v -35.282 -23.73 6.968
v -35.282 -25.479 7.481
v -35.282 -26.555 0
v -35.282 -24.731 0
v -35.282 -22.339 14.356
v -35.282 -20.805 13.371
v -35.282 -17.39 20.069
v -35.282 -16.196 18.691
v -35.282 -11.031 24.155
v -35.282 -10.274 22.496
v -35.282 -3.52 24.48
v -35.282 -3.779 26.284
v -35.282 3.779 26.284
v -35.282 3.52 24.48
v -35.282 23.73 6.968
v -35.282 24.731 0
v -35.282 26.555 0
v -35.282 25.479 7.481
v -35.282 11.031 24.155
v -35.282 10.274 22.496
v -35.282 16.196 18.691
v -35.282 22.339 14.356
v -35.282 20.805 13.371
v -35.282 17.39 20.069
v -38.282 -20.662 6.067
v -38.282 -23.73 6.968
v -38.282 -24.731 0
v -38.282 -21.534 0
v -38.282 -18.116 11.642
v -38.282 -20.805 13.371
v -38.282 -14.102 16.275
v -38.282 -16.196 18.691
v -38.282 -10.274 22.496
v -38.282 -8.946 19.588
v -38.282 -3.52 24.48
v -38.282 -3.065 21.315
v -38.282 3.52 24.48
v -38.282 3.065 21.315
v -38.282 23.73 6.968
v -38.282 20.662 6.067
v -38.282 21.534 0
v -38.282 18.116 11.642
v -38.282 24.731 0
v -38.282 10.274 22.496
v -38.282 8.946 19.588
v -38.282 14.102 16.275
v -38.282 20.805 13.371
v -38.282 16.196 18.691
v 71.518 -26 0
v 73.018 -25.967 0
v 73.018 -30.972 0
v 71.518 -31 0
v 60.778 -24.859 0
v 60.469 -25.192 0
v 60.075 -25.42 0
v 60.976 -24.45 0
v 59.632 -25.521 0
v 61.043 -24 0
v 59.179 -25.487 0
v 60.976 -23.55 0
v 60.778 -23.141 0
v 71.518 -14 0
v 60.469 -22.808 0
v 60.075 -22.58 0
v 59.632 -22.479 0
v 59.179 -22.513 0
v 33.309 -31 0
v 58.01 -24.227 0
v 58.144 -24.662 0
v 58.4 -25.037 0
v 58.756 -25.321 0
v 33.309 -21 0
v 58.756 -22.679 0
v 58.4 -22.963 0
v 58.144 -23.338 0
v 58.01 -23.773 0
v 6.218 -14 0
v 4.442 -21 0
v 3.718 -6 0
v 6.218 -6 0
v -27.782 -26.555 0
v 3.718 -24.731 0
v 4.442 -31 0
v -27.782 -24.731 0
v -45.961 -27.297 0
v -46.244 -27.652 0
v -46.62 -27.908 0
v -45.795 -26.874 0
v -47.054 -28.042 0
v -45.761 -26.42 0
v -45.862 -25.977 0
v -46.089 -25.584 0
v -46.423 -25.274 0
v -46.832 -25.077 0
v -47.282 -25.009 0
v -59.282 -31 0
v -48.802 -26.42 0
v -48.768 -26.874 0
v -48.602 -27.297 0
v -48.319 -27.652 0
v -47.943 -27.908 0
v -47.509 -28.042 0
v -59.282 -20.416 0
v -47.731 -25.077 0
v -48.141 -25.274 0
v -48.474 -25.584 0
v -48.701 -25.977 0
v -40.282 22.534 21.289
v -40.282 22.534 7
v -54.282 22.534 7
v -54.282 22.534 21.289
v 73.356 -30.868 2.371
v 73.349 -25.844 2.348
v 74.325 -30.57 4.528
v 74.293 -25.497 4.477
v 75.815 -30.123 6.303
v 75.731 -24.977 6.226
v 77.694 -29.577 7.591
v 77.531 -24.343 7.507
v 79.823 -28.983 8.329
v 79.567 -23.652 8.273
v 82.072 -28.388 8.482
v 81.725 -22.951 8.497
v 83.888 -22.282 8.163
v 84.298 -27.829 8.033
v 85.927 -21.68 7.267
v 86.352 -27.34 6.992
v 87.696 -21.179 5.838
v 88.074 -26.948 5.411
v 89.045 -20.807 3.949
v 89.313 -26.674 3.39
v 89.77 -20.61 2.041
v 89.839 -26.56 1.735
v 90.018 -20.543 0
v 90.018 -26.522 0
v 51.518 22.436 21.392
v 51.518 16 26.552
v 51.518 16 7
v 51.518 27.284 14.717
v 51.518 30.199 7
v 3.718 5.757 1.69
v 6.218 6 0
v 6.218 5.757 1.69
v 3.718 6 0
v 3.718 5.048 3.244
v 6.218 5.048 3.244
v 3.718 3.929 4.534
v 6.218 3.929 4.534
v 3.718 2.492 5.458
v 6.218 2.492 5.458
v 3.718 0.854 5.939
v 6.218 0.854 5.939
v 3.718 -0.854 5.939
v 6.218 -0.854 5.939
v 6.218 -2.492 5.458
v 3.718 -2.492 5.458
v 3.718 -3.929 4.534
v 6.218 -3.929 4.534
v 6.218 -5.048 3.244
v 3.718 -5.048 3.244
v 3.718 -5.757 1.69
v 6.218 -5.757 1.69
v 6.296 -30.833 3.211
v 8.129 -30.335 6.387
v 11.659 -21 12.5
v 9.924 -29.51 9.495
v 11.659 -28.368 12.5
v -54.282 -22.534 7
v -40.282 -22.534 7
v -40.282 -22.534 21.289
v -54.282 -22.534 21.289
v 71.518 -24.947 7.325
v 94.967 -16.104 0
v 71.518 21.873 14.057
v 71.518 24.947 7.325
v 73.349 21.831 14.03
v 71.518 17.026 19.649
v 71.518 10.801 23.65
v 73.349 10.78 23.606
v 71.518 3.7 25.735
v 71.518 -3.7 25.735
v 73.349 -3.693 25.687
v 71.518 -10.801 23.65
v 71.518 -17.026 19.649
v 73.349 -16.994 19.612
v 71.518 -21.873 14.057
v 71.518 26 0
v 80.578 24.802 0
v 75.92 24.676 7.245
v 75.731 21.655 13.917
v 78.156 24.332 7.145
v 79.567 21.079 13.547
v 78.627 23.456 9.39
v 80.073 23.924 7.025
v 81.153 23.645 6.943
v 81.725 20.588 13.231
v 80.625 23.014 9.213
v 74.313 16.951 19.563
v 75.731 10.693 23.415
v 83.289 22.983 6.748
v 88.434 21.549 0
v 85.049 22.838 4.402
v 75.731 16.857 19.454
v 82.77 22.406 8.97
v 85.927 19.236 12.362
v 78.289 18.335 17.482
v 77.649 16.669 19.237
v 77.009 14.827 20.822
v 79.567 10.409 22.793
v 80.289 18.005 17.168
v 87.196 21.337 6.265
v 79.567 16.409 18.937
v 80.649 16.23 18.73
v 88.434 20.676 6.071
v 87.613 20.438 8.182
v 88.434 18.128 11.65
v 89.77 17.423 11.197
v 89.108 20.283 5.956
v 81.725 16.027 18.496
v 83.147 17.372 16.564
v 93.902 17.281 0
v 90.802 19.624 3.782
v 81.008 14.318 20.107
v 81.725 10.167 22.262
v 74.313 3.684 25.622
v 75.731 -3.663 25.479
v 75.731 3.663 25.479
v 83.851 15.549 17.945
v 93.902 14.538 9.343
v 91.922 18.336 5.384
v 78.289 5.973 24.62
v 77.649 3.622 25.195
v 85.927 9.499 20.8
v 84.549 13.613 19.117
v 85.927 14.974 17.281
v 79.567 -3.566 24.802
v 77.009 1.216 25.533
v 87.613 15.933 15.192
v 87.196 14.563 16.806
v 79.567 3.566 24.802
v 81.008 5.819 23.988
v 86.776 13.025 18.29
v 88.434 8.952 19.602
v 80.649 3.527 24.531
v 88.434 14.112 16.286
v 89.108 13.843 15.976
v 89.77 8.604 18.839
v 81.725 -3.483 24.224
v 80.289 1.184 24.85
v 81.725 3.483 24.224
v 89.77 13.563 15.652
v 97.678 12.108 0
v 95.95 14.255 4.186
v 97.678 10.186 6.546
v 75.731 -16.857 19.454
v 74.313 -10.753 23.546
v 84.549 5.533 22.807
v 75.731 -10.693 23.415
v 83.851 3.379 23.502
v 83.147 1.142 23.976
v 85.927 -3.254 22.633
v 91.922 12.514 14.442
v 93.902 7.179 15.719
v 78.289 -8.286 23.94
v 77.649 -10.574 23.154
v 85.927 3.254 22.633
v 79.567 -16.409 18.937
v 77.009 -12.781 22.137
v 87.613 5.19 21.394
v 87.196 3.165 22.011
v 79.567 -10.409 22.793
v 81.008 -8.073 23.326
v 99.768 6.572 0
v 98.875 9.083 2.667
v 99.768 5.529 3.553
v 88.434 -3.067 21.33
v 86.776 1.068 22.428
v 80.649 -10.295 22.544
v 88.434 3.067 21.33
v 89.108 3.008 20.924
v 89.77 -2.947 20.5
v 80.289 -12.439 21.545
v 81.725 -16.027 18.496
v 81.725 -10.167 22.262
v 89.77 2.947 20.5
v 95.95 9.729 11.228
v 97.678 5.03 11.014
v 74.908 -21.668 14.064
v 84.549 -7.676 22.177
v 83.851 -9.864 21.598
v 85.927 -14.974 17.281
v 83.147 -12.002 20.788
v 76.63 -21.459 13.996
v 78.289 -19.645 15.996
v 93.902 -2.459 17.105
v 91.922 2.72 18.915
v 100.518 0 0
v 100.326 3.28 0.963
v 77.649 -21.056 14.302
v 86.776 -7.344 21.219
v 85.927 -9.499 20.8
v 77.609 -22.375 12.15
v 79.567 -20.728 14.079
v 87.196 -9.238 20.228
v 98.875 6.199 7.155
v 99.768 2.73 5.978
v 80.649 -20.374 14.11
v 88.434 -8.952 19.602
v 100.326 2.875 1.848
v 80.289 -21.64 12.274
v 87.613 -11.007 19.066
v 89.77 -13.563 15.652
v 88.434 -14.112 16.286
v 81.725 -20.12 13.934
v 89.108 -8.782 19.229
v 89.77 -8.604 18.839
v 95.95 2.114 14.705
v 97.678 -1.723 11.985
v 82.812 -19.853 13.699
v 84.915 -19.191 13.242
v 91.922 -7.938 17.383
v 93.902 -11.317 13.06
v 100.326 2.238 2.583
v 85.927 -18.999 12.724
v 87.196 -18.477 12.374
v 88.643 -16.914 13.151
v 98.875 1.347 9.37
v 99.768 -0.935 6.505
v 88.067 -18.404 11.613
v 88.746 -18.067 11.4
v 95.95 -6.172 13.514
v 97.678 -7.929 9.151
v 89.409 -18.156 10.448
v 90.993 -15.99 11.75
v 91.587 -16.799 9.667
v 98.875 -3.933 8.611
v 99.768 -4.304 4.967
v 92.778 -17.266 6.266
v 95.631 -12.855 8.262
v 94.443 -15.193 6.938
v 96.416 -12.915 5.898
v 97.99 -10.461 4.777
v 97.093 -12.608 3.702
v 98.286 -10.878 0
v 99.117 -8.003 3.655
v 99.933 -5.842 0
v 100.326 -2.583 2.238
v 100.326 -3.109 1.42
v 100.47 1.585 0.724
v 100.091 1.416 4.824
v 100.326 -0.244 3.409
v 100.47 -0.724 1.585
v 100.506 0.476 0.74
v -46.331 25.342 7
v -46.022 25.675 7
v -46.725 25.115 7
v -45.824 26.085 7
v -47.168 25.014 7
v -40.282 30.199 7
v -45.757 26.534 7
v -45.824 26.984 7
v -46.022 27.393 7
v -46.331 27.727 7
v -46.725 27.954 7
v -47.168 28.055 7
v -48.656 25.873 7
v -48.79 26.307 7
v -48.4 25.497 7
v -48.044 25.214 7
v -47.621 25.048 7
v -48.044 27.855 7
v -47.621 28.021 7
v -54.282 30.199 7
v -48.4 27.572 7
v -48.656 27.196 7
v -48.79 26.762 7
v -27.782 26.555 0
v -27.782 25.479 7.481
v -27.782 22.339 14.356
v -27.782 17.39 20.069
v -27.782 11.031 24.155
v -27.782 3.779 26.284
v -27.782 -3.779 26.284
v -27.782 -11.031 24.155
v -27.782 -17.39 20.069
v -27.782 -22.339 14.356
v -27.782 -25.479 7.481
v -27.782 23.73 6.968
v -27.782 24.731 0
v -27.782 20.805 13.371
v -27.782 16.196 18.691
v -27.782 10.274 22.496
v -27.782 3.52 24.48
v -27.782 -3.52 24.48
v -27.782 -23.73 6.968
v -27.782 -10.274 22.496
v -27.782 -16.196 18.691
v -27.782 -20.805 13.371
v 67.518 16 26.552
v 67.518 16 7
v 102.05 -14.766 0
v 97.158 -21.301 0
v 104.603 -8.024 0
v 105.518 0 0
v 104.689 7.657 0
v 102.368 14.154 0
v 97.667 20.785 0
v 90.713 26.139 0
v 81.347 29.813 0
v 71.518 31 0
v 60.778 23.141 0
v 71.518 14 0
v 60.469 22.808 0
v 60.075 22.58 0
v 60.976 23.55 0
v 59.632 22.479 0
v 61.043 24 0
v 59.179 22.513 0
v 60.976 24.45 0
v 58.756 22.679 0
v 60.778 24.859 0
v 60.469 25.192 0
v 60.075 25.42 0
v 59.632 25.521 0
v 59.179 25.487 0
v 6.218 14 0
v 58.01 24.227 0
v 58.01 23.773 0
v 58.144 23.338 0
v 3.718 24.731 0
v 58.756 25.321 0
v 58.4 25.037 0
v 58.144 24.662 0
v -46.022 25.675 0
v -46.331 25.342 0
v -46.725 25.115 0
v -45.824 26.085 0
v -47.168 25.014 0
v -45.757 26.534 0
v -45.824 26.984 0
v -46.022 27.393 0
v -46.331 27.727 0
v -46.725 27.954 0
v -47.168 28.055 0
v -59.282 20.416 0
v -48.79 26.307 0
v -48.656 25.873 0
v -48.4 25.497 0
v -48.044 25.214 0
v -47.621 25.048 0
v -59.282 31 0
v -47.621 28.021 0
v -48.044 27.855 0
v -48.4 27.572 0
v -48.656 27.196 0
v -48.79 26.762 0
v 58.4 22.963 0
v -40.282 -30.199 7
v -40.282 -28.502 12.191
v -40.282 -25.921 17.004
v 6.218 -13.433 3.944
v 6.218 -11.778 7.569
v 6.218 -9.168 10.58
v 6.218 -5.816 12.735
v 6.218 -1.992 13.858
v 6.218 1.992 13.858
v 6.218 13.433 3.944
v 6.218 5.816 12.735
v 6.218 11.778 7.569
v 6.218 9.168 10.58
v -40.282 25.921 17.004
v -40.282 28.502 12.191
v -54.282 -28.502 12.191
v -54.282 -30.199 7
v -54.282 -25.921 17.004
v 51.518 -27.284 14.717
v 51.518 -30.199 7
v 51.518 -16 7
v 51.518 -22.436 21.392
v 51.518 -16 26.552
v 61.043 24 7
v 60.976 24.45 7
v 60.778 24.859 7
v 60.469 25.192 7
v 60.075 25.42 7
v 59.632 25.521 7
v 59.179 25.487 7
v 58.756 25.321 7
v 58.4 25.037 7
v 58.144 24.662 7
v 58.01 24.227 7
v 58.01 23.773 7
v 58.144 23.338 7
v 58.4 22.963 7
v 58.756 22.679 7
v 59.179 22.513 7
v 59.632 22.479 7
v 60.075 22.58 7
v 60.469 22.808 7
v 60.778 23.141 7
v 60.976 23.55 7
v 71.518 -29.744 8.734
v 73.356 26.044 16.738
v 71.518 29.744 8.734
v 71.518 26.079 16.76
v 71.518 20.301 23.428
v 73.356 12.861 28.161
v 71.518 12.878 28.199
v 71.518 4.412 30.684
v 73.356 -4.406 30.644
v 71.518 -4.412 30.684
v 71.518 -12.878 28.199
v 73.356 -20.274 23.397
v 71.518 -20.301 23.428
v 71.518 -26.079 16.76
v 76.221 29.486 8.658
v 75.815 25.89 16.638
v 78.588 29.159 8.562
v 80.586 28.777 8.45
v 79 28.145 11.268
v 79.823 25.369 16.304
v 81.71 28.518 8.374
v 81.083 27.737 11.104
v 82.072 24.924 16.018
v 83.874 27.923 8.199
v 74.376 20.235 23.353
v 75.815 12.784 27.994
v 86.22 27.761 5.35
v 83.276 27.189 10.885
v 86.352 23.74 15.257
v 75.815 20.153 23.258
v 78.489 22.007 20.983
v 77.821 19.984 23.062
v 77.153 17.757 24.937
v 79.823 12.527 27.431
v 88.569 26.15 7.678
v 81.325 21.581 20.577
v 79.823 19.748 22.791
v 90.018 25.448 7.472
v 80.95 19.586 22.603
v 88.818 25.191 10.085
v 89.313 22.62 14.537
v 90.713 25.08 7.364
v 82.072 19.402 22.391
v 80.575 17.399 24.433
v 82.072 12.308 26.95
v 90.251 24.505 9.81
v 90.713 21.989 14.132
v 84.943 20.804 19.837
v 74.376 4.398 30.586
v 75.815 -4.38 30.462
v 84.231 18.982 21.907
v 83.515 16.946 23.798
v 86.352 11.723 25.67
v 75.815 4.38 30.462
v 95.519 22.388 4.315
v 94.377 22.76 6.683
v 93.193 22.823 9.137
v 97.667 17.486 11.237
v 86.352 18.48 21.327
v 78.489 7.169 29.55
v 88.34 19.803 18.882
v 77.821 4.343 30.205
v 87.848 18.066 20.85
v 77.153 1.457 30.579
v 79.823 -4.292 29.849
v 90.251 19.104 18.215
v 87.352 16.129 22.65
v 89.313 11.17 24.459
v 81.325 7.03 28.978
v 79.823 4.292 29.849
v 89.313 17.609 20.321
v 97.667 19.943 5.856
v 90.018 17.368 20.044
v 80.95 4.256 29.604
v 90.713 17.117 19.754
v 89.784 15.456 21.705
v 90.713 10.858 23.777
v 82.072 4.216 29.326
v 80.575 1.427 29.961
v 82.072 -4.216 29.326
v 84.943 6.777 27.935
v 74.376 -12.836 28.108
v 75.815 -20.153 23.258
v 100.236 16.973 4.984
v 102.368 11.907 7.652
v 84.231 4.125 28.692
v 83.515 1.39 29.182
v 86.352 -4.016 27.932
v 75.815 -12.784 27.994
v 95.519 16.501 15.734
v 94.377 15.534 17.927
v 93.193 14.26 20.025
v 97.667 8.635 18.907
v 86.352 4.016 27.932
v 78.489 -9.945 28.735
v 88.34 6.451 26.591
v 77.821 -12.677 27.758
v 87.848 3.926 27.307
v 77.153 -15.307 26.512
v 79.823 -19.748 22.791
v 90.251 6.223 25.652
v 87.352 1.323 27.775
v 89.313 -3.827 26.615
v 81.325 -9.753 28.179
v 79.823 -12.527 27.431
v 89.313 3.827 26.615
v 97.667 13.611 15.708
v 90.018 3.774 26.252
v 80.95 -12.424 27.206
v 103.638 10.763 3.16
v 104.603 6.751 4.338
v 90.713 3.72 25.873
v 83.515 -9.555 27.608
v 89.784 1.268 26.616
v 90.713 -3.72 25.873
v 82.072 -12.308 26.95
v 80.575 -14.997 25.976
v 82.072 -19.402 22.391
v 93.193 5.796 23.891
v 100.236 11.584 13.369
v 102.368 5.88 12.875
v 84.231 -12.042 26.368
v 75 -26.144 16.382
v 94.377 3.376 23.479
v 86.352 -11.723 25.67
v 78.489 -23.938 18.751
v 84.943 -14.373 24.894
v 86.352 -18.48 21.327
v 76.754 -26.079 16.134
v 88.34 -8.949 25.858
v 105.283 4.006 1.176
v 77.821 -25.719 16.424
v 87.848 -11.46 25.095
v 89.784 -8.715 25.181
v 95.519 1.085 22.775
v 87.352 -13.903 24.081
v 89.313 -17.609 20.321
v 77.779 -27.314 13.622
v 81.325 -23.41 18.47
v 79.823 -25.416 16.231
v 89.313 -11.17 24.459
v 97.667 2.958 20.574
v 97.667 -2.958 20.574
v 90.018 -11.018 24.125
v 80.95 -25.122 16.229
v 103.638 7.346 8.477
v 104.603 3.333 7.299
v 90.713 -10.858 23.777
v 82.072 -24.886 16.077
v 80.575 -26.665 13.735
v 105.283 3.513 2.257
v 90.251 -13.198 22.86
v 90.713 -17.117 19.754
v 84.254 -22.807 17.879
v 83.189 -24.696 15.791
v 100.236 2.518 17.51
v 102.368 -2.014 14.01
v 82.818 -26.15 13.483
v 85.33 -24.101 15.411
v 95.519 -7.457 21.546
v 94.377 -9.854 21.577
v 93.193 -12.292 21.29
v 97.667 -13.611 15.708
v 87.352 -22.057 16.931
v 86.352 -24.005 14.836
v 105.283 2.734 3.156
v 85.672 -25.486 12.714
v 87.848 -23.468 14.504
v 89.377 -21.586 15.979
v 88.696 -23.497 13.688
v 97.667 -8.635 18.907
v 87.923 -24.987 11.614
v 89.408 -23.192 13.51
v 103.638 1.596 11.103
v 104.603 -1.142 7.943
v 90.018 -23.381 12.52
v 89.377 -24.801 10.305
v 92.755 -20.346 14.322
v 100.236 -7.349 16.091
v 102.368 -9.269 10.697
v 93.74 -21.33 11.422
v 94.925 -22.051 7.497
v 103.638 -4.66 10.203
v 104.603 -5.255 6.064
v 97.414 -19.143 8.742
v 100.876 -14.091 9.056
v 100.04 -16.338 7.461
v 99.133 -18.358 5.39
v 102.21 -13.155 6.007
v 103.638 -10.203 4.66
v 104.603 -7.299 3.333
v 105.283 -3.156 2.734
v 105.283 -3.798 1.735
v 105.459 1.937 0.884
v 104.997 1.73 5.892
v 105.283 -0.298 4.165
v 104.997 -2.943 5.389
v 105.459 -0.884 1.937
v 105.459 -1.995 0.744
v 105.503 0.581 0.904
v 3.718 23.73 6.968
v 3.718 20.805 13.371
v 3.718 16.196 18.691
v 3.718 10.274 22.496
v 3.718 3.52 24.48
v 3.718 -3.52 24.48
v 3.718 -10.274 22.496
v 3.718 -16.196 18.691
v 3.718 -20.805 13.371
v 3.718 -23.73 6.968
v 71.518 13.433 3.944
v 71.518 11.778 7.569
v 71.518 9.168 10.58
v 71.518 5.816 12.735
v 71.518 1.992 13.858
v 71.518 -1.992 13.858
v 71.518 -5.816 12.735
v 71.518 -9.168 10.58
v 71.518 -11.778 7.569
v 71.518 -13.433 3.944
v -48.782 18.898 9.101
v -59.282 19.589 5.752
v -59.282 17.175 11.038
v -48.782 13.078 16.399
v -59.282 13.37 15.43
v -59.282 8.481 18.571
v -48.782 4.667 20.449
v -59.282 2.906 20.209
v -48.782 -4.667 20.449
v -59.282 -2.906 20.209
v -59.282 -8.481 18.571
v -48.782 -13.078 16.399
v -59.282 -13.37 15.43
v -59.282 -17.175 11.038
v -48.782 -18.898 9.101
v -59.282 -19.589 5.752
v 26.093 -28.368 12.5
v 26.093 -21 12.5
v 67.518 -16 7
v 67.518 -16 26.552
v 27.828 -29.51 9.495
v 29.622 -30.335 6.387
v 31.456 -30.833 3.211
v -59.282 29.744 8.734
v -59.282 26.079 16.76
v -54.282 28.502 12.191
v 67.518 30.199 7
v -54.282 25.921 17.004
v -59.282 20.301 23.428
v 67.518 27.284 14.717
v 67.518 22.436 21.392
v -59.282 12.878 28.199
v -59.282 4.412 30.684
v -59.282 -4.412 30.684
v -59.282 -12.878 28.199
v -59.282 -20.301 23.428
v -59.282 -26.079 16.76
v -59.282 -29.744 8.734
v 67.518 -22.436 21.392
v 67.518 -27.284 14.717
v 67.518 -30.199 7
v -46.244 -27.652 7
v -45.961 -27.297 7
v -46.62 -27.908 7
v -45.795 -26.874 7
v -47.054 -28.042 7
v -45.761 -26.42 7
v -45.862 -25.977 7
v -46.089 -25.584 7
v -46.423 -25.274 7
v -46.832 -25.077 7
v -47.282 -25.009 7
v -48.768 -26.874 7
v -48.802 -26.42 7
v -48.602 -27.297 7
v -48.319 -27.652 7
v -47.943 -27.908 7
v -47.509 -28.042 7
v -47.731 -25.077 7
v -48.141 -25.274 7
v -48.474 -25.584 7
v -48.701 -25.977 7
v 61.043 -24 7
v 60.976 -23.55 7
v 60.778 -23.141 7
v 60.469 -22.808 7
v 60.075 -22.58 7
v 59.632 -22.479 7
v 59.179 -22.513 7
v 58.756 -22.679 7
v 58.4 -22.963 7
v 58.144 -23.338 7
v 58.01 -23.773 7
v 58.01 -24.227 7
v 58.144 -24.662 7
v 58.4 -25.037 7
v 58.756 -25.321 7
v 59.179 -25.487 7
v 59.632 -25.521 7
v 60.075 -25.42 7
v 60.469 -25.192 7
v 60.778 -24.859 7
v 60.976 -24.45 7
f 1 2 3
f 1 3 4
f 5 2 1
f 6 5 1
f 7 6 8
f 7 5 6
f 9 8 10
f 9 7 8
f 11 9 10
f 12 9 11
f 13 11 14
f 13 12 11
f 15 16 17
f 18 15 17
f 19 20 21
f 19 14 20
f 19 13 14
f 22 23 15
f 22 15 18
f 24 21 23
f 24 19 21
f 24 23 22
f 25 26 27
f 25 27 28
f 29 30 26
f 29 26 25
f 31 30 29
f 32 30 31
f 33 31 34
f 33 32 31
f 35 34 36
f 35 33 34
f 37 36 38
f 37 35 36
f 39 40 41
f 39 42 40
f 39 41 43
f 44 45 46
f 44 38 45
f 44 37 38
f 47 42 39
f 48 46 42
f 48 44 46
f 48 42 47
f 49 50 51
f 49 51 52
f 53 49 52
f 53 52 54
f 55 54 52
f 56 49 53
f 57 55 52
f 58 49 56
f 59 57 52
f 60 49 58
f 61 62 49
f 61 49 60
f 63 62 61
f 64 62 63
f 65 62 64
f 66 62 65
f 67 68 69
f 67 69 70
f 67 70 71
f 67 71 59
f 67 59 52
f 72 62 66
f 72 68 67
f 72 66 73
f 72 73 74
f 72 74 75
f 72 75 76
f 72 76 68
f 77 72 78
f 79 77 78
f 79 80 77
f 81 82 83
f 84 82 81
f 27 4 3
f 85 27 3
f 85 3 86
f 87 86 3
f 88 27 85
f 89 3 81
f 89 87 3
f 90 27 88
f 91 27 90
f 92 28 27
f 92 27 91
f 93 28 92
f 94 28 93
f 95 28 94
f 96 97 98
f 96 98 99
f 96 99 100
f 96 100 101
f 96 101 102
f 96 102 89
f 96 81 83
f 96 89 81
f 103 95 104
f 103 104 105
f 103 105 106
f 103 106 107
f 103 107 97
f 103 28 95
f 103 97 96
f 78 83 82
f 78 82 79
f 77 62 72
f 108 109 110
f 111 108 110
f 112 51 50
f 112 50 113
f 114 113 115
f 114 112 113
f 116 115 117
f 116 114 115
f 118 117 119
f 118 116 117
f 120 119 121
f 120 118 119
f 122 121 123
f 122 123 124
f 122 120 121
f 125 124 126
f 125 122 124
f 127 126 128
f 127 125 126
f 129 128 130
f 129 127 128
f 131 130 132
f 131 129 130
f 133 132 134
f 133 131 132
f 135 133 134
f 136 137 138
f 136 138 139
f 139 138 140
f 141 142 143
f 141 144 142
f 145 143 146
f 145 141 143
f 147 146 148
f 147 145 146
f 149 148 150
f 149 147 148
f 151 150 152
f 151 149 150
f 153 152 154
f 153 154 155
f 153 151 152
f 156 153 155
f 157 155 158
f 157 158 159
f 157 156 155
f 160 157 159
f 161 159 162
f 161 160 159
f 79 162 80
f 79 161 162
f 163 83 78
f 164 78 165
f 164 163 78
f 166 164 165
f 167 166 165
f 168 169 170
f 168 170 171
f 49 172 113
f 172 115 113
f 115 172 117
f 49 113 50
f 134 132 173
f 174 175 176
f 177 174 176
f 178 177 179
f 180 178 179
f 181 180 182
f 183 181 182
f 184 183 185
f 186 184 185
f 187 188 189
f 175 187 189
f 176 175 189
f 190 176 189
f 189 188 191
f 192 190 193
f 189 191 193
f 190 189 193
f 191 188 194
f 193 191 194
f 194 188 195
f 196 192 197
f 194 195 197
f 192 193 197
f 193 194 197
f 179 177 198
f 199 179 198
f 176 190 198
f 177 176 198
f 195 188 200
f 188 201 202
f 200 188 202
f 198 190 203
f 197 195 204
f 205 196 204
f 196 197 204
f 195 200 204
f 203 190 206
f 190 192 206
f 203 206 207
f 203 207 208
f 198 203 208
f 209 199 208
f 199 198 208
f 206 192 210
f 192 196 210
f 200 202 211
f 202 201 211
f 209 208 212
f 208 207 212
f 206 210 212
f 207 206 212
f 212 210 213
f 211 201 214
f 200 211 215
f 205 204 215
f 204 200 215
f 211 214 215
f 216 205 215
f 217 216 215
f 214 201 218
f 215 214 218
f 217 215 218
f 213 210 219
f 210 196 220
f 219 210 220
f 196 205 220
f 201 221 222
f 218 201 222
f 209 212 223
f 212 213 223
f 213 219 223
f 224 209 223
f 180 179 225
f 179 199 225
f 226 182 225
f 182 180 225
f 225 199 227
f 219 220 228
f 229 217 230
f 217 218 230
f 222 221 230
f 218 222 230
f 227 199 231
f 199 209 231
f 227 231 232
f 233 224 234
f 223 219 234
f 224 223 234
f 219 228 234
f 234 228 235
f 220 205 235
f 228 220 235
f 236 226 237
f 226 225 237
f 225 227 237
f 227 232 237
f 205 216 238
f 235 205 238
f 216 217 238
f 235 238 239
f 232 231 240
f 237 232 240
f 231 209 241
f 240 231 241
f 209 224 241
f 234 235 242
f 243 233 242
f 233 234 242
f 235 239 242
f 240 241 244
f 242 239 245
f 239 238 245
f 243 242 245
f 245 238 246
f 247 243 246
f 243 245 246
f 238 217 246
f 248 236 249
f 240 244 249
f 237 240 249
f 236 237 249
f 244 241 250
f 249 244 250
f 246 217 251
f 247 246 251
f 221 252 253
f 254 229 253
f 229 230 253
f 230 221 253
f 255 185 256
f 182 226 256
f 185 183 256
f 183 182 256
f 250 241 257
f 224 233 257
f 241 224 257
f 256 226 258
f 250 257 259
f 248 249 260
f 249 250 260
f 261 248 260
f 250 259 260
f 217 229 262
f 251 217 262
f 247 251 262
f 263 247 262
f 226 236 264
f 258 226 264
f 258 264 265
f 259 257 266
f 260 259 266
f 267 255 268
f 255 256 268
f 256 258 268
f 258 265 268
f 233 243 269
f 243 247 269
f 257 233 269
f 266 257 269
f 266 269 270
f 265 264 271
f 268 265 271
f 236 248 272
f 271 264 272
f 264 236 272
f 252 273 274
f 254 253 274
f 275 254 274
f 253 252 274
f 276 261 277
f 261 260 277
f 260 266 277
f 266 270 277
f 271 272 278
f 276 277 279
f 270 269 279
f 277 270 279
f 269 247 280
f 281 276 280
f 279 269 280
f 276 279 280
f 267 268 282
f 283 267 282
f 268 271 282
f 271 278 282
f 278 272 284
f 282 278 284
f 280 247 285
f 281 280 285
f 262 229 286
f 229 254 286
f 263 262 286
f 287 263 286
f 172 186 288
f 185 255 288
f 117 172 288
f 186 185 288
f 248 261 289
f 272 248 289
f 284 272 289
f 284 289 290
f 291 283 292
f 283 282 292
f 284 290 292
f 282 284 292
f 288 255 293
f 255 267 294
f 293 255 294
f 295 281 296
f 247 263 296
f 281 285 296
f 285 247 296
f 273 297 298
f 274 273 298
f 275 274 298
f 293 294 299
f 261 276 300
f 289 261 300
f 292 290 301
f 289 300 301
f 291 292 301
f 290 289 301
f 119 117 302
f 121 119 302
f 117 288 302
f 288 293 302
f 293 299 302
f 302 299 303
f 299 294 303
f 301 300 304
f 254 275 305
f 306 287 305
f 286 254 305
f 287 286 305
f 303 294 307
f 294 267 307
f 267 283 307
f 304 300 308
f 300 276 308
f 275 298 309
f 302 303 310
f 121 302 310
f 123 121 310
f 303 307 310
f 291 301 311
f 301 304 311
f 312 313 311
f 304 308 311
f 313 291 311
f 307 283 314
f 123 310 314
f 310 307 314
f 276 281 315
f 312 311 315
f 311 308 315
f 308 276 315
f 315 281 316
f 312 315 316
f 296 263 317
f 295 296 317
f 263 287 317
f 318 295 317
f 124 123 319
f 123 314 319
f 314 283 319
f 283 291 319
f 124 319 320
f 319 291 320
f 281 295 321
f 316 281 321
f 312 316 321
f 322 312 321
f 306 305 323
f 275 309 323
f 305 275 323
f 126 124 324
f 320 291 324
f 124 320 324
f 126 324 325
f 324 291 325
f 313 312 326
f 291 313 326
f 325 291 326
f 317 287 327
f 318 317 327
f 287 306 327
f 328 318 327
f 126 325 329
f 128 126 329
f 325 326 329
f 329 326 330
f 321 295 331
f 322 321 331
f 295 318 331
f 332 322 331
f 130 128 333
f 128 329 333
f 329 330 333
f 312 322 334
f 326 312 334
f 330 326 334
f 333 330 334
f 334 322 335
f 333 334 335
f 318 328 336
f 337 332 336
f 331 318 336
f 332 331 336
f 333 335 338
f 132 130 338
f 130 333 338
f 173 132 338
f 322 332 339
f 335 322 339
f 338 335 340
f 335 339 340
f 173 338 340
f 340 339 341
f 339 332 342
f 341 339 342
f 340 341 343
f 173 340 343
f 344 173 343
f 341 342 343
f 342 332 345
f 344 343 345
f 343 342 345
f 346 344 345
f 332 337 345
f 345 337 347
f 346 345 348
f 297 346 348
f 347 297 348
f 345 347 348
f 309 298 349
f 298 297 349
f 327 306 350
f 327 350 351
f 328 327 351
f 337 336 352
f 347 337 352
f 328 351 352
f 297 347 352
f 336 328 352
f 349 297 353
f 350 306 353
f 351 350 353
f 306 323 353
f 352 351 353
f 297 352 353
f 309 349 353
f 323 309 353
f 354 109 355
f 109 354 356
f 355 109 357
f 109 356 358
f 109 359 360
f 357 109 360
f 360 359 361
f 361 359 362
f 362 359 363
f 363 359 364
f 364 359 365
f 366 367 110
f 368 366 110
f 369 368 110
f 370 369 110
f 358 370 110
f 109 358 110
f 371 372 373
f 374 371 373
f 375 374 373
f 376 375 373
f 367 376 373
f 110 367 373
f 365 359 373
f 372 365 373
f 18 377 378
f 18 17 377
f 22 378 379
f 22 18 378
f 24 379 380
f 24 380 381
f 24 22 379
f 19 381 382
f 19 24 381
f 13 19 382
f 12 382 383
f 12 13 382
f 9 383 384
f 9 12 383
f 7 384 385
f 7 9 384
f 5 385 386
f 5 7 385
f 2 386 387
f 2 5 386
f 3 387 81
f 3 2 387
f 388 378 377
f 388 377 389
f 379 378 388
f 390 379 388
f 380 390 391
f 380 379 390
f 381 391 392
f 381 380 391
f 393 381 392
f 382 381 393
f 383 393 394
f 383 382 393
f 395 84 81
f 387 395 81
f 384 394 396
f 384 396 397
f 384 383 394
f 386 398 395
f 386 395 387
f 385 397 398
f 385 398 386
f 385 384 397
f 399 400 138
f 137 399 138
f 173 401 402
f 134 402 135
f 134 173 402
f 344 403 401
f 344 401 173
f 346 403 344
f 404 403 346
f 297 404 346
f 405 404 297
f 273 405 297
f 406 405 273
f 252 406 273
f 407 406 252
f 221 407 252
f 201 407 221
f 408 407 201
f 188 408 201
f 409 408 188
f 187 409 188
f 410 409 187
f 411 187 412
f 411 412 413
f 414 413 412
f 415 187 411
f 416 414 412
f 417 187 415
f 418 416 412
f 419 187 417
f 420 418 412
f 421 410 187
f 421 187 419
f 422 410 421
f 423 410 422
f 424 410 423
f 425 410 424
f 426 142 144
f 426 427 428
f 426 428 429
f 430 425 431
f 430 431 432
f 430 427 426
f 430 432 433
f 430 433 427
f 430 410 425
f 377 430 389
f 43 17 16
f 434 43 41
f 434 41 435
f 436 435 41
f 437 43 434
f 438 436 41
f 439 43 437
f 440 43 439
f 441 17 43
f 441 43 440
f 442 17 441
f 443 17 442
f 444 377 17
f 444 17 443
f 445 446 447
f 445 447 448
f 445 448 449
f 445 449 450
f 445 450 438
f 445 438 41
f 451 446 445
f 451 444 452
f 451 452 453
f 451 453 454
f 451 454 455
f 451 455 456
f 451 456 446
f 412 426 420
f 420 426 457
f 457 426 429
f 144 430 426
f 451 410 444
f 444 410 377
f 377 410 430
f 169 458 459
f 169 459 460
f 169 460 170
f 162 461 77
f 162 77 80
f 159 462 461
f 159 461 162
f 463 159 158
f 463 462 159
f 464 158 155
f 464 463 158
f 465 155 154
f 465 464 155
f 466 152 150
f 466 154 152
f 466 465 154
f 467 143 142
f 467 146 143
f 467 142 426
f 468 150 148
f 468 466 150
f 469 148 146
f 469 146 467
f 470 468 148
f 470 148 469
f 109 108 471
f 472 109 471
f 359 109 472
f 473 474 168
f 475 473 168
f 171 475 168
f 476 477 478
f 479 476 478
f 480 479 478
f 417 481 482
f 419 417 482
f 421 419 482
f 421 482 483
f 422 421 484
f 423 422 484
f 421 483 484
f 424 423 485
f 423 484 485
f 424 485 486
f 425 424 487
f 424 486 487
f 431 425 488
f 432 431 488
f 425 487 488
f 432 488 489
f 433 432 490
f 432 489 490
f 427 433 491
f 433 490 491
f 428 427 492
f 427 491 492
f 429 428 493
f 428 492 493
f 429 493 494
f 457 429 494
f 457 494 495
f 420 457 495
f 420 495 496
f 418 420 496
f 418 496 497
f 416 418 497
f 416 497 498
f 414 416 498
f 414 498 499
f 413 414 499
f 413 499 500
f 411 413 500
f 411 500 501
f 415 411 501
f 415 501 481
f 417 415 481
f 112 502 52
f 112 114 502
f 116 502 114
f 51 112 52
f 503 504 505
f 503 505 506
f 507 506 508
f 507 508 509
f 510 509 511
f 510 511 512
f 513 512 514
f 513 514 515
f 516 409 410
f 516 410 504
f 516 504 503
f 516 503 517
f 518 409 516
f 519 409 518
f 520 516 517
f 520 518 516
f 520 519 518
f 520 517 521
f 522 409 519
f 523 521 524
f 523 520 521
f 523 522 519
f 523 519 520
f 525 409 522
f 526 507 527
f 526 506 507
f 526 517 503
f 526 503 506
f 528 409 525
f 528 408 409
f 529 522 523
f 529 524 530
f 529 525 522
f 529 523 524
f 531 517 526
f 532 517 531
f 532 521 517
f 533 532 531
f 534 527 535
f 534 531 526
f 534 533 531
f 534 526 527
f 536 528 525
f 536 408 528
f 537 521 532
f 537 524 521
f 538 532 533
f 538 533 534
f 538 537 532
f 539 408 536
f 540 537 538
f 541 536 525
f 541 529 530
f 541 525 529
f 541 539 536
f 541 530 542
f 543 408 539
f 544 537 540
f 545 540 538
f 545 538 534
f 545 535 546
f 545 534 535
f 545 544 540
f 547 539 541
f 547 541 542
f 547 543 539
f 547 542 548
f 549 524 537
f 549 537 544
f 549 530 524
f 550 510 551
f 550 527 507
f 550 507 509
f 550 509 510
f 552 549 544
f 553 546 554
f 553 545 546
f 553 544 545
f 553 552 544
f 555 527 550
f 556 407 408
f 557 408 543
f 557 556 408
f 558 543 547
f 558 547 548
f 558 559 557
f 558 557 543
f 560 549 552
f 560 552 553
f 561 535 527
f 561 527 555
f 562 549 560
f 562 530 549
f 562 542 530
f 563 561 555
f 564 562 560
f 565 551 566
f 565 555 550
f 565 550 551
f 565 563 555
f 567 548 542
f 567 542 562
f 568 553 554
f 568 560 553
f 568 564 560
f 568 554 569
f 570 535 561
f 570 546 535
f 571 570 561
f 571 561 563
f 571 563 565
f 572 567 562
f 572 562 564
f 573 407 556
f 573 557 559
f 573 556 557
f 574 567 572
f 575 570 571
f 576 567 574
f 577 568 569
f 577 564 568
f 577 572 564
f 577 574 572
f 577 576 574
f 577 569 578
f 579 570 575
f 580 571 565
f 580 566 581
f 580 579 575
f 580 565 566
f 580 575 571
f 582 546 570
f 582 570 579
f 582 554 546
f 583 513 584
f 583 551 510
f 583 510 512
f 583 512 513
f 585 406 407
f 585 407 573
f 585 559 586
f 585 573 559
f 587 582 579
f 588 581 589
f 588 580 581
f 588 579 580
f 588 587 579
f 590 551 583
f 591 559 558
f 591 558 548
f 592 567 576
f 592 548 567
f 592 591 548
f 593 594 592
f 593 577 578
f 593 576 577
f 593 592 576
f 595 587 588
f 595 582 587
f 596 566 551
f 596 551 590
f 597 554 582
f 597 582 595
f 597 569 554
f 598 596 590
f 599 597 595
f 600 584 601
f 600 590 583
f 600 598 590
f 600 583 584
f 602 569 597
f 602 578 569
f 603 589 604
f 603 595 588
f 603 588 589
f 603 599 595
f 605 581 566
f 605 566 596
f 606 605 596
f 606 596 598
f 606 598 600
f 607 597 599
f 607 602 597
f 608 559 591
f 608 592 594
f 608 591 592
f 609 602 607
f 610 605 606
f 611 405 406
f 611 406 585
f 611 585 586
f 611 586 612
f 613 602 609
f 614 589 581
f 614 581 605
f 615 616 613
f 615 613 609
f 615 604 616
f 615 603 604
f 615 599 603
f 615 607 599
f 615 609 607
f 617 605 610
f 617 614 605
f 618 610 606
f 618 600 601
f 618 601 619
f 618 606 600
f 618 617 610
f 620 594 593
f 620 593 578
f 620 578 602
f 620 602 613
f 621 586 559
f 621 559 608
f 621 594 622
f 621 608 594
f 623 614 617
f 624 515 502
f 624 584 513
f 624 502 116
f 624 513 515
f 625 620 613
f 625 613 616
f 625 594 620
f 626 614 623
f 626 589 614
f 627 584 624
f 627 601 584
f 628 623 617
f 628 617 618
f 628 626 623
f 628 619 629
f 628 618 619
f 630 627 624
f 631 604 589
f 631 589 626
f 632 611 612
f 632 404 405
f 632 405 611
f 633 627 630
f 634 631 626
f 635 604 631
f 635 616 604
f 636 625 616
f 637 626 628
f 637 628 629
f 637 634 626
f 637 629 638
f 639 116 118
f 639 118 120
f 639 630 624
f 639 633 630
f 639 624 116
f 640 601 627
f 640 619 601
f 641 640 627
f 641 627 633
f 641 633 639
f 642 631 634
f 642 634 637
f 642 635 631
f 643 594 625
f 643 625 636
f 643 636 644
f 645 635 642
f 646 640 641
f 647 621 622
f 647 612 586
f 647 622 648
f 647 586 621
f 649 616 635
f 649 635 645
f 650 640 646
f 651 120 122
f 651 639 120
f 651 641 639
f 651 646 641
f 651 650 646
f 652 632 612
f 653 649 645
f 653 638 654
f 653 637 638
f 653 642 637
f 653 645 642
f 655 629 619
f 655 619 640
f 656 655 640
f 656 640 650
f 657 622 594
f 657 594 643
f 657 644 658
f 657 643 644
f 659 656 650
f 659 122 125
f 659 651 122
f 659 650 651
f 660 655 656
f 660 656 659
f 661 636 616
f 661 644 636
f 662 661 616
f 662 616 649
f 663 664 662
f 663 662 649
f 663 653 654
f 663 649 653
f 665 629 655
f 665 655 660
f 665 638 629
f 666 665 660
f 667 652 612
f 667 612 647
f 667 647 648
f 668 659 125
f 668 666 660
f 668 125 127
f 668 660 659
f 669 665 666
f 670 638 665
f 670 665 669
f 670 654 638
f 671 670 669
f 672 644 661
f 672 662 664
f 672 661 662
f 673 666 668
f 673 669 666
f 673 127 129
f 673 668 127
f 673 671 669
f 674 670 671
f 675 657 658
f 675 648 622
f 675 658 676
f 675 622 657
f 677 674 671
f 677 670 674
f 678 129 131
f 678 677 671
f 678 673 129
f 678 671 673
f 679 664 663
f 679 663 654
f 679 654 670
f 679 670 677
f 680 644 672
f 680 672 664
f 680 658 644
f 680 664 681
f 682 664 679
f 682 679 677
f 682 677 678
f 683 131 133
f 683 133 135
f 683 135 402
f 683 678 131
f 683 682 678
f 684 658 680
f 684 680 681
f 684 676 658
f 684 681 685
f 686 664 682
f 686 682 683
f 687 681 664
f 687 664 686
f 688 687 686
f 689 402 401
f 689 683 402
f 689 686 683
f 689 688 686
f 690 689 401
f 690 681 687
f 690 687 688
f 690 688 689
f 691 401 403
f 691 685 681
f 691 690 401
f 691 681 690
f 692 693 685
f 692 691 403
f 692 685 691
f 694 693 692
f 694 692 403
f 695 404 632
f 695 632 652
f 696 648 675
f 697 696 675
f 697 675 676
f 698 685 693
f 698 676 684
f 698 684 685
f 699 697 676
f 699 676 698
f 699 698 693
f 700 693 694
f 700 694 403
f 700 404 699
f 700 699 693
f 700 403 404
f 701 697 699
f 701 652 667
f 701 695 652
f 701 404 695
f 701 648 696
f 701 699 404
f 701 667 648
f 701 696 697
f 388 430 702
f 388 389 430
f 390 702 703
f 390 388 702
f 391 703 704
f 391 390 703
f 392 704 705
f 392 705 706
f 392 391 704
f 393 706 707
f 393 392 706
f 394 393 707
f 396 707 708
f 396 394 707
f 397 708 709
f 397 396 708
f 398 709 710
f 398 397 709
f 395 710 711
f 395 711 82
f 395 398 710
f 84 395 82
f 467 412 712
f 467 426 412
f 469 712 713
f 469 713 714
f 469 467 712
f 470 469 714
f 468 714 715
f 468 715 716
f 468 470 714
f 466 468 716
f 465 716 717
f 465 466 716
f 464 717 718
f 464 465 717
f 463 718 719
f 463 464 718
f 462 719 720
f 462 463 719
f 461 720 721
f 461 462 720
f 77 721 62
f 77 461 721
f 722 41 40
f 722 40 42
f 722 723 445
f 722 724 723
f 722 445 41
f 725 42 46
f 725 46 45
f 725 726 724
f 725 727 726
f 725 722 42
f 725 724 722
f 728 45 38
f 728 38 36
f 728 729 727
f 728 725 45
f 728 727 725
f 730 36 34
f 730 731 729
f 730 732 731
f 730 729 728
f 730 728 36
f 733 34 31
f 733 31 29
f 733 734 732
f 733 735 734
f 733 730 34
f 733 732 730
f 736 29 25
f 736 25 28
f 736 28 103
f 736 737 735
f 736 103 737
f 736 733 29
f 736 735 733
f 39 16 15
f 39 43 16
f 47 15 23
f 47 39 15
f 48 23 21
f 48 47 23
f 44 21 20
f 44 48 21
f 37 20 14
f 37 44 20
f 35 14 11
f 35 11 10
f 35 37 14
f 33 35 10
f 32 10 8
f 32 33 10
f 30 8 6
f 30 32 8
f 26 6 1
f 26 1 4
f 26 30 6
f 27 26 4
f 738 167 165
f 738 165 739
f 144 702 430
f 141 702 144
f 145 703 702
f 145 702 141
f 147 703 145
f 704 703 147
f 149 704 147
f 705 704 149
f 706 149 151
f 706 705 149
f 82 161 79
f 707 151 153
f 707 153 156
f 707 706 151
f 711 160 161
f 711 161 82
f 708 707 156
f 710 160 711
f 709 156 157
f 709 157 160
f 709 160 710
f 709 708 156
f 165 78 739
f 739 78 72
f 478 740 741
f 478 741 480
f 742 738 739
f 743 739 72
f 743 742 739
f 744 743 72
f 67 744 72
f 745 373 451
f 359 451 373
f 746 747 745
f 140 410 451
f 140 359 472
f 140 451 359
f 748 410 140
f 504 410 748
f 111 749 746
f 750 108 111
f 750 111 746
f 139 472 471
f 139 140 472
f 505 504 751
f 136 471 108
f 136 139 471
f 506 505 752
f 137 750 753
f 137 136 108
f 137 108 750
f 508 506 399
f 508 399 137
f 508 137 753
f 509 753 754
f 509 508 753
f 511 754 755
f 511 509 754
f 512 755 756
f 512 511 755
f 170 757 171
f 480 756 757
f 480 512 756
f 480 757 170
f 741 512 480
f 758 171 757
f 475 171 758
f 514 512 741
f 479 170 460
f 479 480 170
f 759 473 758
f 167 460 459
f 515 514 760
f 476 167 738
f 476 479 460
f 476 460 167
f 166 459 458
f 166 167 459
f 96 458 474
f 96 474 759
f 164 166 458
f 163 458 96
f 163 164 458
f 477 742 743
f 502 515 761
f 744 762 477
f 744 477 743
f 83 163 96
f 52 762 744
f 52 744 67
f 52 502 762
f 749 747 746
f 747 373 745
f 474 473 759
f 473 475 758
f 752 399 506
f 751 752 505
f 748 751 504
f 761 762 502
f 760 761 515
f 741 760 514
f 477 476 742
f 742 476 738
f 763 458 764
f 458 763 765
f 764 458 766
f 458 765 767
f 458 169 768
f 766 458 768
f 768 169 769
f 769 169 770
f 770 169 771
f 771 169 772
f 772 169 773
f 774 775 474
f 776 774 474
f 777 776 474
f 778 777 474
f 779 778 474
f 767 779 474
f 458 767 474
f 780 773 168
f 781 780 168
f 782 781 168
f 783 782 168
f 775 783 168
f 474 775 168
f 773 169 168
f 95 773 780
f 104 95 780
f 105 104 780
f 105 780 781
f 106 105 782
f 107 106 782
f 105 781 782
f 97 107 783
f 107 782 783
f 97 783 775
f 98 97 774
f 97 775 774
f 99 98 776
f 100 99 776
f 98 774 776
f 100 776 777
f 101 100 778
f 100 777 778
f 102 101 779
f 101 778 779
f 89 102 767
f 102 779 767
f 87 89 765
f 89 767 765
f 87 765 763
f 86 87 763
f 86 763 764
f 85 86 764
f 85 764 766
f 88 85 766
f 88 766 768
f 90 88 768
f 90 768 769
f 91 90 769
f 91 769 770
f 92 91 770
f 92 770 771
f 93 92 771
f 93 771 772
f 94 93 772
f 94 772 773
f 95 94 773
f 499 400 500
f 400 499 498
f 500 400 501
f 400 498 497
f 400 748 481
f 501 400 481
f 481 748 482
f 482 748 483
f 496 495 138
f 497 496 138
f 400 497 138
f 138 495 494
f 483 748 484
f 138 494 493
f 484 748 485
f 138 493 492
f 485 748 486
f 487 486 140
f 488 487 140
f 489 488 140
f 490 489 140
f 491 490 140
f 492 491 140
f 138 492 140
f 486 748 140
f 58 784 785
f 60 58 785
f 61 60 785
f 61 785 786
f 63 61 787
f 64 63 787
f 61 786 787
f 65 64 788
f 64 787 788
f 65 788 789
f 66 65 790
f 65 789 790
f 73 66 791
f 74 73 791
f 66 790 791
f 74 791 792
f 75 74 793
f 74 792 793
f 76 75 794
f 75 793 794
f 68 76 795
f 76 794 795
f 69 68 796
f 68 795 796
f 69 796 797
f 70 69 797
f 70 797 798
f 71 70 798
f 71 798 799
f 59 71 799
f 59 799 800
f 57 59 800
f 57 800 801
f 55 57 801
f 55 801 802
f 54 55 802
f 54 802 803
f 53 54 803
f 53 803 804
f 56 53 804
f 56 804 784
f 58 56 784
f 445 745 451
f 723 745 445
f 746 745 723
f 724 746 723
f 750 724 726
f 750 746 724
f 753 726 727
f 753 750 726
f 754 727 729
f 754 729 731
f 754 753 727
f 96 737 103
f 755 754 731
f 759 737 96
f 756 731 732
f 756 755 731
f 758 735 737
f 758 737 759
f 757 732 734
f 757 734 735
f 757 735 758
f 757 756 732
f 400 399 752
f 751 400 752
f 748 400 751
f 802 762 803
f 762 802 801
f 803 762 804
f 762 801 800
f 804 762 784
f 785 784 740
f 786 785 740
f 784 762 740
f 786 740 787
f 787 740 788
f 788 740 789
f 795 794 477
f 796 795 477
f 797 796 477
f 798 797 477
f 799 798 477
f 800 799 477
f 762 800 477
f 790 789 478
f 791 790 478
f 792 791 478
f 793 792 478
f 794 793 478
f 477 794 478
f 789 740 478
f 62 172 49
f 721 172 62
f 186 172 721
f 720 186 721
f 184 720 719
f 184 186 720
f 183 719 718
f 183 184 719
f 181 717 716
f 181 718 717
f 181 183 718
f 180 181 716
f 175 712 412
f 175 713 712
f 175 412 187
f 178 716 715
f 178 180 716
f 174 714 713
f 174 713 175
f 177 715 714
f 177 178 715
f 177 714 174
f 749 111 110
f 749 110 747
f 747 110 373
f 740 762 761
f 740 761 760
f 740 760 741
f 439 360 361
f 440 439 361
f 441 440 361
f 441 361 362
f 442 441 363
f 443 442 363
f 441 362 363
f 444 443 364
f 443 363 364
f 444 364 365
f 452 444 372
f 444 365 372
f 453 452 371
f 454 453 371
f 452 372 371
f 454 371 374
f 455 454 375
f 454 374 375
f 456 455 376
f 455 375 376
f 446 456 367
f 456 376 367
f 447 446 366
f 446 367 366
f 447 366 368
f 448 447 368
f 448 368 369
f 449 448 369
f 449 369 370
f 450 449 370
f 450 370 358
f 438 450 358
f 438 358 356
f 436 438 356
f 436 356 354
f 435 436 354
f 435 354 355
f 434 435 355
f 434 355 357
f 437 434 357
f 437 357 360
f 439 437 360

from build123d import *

# Parameters (mm, degrees)
REVOLVE1_ANGLE          = 180
CUT_EXTRUDE1_REACH      = 114.566
CUT_EXTRUDE1_END_RADIUS = 31
SKETCH2_W               = 14
SKETCH2_H               = 8.465653043
SKETCH2_W_2             = 16
SKETCH2_H_2             = 15
CUT_EXTRUDE2_REACH      = 114.566
SKETCH3_R               = 1.525
CUT_EXTRUDE3_DEPTH      = 10
CUT_EXTRUDE4_REACH      = 128.25
SKETCH6_R               = 8.5


with BuildPart() as part:
    # Sketch1 → Revolve1 (revolve)
    with BuildSketch(Plane.XY):
        with BuildLine():
            Line((6.218316837, 14), (6.218316837, 6))
            Line((6.218316837, 6), (3.718316837, 6))
            Line((3.718316837, 6), (3.718316837, 24.731367941))
            Line((3.718316837, 24.731367941), (-10.171408573, 24.731367941))
            Line((-10.171408573, 24.731367941), (-27.781683163, 24.731367941))
            Line((-27.781683163, 24.731367941), (-27.781683163, 26.554502519))
            Line((-27.781683163, 26.554502519), (-35.281683163, 26.554502519))
            Line((-35.281683163, 26.554502519), (-35.281683163, 24.731367941))
            Line((-35.281683163, 24.731367941), (-38.281683163, 24.731367941))
            Line((-38.281683163, 24.731367941), (-38.281683163, 21.534346957))
            Line((-38.281683163, 21.534346957), (-59.281683163, 20.416426404))
            Line((-59.281683163, 20.416426404), (-59.281683163, 24.731367941))
            Line((-59.281683163, 24.731367941), (-59.281683163, 31))
            Line((-59.281683163, 31), (-56.981683163, 31))
            Line((-56.981683163, 31), (71.518316837, 31))
            add(Edge.make_bspline(
                [(71.518316837, 31), (87.336893309, 31), (105.518316837, 21.771712161), (105.518316837, 0)],
                knots=[0, 0, 0, 0, 1, 1, 1, 1], degree=3))
            Line((105.518316837, 0), (100.518316813, 0))
            add(Edge.make_bspline(
                [(71.518316837, 26), (84.501211561, 26), (100.518316813, 18.460024777), (100.518316813, 0)],
                knots=[0, 0, 0, 0, 1, 1, 1, 1], degree=3))
            Line((71.518316837, 26), (71.518316837, 14))
            Line((71.518316837, 14), (6.218316837, 14))
        make_face()
    revolve(axis=Axis((-52.937293729, 0, 0), (1, 0, 0)), revolution_arc=REVOLVE1_ANGLE)

    # Cut-Extrude1: up to this cylinder (the profile starts inside it)
    cut_extrude1_end = Plane(origin=(6.118317, 0, 0), z_dir=(-1, 0, 0)) * Cylinder(CUT_EXTRUDE1_END_RADIUS, 398.932, mode=Mode.PRIVATE)
    # Sketch2 → Cut-Extrude1 (cut, up to the surface)
    with BuildSketch(Plane(origin=(0, 0, 7), x_dir=(-1, 0, 0), z_dir=(0, 0, -1)), mode=Mode.PRIVATE) as cut_extrude1_sk1:
        with Locations((47.281683163, 26.767173479)):
            Rectangle(SKETCH2_W, SKETCH2_H)
    cut_extrude1_tool1 = extrude(cut_extrude1_sk1.sketch, amount=-CUT_EXTRUDE1_REACH, mode=Mode.PRIVATE) & cut_extrude1_end
    add(cut_extrude1_tool1.solids().sort_by_distance((-47.281683, 26.767173, 7))[0], mode=Mode.SUBTRACT)
    # Sketch2 → Cut-Extrude1 (cut, up to the surface)
    with BuildSketch(Plane(origin=(0, 0, 7), x_dir=(-1, 0, 0), z_dir=(0, 0, -1)), mode=Mode.PRIVATE) as cut_extrude1_sk2:
        with Locations((-59.518316837, -23.5)):
            Rectangle(SKETCH2_W_2, SKETCH2_H_2)
    cut_extrude1_tool2 = extrude(cut_extrude1_sk2.sketch, amount=-CUT_EXTRUDE1_REACH, mode=Mode.PRIVATE) & cut_extrude1_end
    add(cut_extrude1_tool2.solids().sort_by_distance((59.518317, -23.5, 7))[0], mode=Mode.SUBTRACT)
    # Sketch2 → Cut-Extrude1 (cut, up to the surface)
    with BuildSketch(Plane(origin=(0, 0, 7), x_dir=(-1, 0, 0), z_dir=(0, 0, -1)), mode=Mode.PRIVATE) as cut_extrude1_sk3:
        with Locations((-59.518316837, 23.5)):
            Rectangle(SKETCH2_W_2, SKETCH2_H_2)
    cut_extrude1_tool3 = extrude(cut_extrude1_sk3.sketch, amount=-CUT_EXTRUDE1_REACH, mode=Mode.PRIVATE) & cut_extrude1_end
    add(cut_extrude1_tool3.solids().sort_by_distance((59.518317, 23.5, 7))[0], mode=Mode.SUBTRACT)
    # Sketch2 → Cut-Extrude1 (cut, up to the surface)
    with BuildSketch(Plane(origin=(0, 0, 7), x_dir=(-1, 0, 0), z_dir=(0, 0, -1)), mode=Mode.PRIVATE) as cut_extrude1_sk4:
        with Locations((47.281683163, -26.767173479)):
            Rectangle(SKETCH2_W, SKETCH2_H)
    cut_extrude1_tool4 = extrude(cut_extrude1_sk4.sketch, amount=-CUT_EXTRUDE1_REACH, mode=Mode.PRIVATE) & cut_extrude1_end
    add(cut_extrude1_tool4.solids().sort_by_distance((-47.281683, -26.767173, 7))[0], mode=Mode.SUBTRACT)

    # Sketch3 → Cut-Extrude2 (cut, up to next)
    with BuildSketch(Plane.XY.offset(7), mode=Mode.PRIVATE) as cut_extrude2_sk1:
        with Locations((-47.281683163, 26.534346957)):
            Circle(SKETCH3_R)
    cut_extrude2_tool1 = extrude(cut_extrude2_sk1.sketch, amount=-CUT_EXTRUDE2_REACH, mode=Mode.PRIVATE) & part.part
    # Sketch3 → Cut-Extrude2 (cut, up to next)
    with BuildSketch(Plane.XY.offset(7), mode=Mode.PRIVATE) as cut_extrude2_sk2:
        with Locations(Location((-47.281683163, -26.534346957, 0), (0, 0, 90))):
            Circle(SKETCH3_R)
    cut_extrude2_tool2 = extrude(cut_extrude2_sk2.sketch, amount=-CUT_EXTRUDE2_REACH, mode=Mode.PRIVATE) & part.part
    # Sketch3 → Cut-Extrude2 (cut, up to next)
    with BuildSketch(Plane.XY.offset(7), mode=Mode.PRIVATE) as cut_extrude2_sk3:
        with Locations((59.518316837, 24)):
            Circle(SKETCH3_R)
    cut_extrude2_tool3 = extrude(cut_extrude2_sk3.sketch, amount=-CUT_EXTRUDE2_REACH, mode=Mode.PRIVATE) & part.part
    # Sketch3 → Cut-Extrude2 (cut, up to next)
    with BuildSketch(Plane.XY.offset(7), mode=Mode.PRIVATE) as cut_extrude2_sk4:
        with Locations((59.518316837, -24)):
            Circle(SKETCH3_R)
    cut_extrude2_tool4 = extrude(cut_extrude2_sk4.sketch, amount=-CUT_EXTRUDE2_REACH, mode=Mode.PRIVATE) & part.part
    add(cut_extrude2_tool1.solids().sort_by_distance((-47.281683, 26.534347, 7))[0], mode=Mode.SUBTRACT)
    add(cut_extrude2_tool2.solids().sort_by_distance((-47.281683, -26.534347, 7))[0], mode=Mode.SUBTRACT)
    add(cut_extrude2_tool3.solids().sort_by_distance((59.518317, 24, 7))[0], mode=Mode.SUBTRACT)
    add(cut_extrude2_tool4.solids().sort_by_distance((59.518317, -24, 7))[0], mode=Mode.SUBTRACT)

    # Sketch5 → Cut-Extrude3 (cut)
    with BuildSketch(Plane(origin=(0, -31, 0), x_dir=(1, 0, 0), z_dir=(0, 1, 0))):
        Polygon((4.441941487, 0), (11.658819852, -12.5), (26.092576582, -12.5), (33.309454947, 0), (26.092576582, 12.5), (11.658819852, 12.5), align=None)
    extrude(amount=CUT_EXTRUDE3_DEPTH, mode=Mode.SUBTRACT)

    # Sketch6 → Cut-Extrude4 (cut, up to next)
    with BuildSketch(Plane(origin=(0, -31, 0), x_dir=(1, 0, 0), z_dir=(0, 1, 0)), mode=Mode.PRIVATE) as cut_extrude4_sk1:
        with Locations((81.518316837, 0)):
            Circle(SKETCH6_R)
    cut_extrude4_tool1 = extrude(cut_extrude4_sk1.sketch, amount=CUT_EXTRUDE4_REACH, mode=Mode.PRIVATE) & part.part
    add(cut_extrude4_tool1.solids().sort_by_distance((81.518317, -31, 0))[0], mode=Mode.SUBTRACT)


solid = part.part
